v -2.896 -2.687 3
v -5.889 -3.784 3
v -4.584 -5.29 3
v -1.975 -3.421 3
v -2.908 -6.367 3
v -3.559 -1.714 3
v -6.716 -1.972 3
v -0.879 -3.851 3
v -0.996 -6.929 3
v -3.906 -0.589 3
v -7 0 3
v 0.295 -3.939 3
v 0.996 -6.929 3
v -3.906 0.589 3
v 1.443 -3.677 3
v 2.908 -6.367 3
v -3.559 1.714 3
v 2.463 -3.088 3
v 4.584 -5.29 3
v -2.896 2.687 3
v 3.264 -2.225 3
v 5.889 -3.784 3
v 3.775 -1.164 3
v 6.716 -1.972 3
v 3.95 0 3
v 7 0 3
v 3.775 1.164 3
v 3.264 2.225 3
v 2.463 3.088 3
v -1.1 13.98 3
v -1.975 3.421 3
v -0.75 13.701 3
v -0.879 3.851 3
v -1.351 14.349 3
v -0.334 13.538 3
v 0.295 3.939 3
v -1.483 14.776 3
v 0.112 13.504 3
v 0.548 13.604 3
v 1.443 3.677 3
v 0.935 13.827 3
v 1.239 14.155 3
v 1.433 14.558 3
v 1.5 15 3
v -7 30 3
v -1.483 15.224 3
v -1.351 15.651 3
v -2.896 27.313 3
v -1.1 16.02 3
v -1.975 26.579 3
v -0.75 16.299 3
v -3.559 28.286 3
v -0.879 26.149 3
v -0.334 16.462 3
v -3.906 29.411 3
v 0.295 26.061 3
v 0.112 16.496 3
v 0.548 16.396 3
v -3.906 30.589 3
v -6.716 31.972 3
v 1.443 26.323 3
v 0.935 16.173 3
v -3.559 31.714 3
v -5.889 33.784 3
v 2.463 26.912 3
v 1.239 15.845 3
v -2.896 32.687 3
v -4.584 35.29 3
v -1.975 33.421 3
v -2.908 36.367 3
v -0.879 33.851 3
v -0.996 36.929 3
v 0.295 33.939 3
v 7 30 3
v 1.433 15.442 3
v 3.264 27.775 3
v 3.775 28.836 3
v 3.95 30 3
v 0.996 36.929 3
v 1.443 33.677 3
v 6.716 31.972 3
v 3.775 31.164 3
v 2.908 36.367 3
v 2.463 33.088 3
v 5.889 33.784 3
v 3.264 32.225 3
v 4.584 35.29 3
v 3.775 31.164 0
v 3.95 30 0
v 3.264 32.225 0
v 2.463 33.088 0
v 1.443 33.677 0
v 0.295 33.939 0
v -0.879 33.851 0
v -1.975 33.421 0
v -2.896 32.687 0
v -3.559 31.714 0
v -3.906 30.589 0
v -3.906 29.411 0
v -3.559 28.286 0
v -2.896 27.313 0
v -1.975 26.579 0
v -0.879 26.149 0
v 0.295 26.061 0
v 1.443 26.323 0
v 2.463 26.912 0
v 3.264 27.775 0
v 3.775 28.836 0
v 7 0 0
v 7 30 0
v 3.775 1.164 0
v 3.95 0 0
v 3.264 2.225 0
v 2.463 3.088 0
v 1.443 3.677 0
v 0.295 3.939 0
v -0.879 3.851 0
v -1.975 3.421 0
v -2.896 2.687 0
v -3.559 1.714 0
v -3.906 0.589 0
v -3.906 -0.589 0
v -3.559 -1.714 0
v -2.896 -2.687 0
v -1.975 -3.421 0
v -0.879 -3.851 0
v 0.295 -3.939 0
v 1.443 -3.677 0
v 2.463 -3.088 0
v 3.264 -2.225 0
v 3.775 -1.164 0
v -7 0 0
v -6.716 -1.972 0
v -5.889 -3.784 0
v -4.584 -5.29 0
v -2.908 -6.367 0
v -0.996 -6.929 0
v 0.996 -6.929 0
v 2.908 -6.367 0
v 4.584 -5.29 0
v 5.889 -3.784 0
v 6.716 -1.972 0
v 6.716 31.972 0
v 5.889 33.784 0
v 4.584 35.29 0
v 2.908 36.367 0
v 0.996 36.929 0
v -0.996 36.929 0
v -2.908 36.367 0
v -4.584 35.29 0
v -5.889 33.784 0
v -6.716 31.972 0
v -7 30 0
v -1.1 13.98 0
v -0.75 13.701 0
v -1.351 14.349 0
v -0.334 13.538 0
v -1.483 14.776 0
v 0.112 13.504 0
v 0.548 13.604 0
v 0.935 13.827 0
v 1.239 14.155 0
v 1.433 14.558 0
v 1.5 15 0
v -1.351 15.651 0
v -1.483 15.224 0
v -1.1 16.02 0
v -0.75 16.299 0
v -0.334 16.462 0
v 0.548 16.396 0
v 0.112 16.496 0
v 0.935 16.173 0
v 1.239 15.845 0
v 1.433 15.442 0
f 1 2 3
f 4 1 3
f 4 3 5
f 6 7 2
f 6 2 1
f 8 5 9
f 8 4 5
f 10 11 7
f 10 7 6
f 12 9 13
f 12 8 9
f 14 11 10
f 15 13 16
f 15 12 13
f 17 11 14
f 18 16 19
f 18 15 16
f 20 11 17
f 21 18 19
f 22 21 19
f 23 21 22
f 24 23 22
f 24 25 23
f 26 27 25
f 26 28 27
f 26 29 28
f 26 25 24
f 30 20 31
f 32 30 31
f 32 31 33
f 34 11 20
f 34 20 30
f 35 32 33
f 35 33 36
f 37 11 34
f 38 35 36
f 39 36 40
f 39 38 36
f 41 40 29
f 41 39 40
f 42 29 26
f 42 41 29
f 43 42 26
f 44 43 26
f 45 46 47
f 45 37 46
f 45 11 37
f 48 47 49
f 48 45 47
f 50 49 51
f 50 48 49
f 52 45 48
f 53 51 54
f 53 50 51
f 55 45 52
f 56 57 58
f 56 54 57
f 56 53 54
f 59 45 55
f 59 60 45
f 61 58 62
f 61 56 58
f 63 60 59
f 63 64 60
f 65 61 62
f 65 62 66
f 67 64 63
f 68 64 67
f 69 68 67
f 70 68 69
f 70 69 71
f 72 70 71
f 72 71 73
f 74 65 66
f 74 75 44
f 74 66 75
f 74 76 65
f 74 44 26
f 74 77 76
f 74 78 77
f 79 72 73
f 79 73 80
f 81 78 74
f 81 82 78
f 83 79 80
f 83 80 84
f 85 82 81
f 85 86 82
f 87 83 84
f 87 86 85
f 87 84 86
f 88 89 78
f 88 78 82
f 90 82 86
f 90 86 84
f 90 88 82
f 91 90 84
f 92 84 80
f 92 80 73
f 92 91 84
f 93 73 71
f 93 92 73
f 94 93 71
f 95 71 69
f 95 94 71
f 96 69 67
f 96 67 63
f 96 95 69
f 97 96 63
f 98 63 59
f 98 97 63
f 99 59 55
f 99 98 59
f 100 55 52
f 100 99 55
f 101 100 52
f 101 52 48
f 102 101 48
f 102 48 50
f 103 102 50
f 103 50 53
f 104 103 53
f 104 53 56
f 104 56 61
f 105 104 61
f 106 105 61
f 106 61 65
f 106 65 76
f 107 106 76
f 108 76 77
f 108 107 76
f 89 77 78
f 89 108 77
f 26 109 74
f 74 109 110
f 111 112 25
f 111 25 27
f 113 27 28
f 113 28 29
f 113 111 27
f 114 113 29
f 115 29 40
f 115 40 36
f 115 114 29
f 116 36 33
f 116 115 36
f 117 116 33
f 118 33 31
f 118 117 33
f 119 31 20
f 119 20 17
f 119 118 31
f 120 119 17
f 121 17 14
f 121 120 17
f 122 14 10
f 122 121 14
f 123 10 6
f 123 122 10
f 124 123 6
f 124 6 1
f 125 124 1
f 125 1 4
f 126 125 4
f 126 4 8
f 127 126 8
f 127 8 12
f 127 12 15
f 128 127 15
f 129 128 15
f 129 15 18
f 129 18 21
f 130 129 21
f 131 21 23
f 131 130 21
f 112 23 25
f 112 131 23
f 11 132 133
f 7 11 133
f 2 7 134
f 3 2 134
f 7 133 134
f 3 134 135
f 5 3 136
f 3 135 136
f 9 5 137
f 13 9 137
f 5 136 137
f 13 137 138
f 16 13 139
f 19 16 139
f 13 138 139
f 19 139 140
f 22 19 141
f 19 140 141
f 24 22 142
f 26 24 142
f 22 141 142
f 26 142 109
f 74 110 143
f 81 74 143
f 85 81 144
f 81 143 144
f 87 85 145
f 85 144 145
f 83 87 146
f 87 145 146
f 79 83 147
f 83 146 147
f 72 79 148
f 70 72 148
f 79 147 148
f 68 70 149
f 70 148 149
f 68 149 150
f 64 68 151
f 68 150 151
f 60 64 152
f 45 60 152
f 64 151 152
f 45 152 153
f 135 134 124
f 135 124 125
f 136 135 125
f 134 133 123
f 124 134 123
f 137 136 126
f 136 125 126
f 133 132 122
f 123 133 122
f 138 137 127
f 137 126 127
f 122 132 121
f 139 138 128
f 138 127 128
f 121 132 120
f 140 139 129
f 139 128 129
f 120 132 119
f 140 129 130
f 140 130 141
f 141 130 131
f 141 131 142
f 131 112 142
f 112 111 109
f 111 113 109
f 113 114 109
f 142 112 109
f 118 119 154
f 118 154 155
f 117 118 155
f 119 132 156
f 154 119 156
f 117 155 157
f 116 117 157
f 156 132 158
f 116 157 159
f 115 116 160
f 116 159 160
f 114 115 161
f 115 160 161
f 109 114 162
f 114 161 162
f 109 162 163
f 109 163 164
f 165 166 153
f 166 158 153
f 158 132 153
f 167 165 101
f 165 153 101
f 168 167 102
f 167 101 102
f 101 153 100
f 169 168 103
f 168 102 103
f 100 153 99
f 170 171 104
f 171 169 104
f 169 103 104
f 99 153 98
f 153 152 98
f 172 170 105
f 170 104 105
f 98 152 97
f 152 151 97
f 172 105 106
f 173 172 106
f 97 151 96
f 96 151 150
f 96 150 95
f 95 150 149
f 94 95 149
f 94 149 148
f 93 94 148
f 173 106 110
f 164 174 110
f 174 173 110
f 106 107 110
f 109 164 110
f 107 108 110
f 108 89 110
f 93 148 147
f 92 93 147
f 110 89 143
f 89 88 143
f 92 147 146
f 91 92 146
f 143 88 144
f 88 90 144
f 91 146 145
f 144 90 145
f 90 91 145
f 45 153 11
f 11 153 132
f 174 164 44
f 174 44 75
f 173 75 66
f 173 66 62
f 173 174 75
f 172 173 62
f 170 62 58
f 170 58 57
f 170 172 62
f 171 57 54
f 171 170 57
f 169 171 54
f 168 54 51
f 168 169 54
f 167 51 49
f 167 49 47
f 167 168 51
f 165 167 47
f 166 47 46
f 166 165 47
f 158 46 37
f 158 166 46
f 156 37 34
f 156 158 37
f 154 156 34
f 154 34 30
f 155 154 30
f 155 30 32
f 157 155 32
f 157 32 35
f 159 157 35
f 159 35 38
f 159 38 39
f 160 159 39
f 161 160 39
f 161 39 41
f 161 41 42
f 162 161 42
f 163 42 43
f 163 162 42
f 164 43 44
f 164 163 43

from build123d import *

# Parameters (mm, degrees)
SKETCH_1_R      = 7
SKETCH_1_R_2    = 3.95
SKETCH_1_R_3    = 1.5
EXTRUDE_1_DEPTH = 3


with BuildPart() as part:
    # 草图1 → 凸台-拉伸1 (new body)
    # profile 1 of 3: a face of its own
    with BuildSketch(Plane.XY):
        with Locations((0, 30)):
            Circle(SKETCH_1_R)
        with Locations((0, 30)):
            Circle(SKETCH_1_R_2, mode=Mode.SUBTRACT)
    # profile 2 of 3: a face of its own
    with BuildSketch(Plane.XY):
        with BuildLine():
            ThreePointArc((7, 30), (0, 23), (-7, 30))
            Line((-7, 30), (-7, 0))
            ThreePointArc((-7, 0), (0, 7), (7, 0))
            Line((7, 0), (7, 30))
        make_face()
        with Locations((0, 15)):
            Circle(SKETCH_1_R_3, mode=Mode.SUBTRACT)
    # profile 3 of 3: a face of its own
    with BuildSketch(Plane.XY):
        Circle(SKETCH_1_R)
        Circle(SKETCH_1_R_2, mode=Mode.SUBTRACT)
    extrude(amount=EXTRUDE_1_DEPTH)


solid = part.part
